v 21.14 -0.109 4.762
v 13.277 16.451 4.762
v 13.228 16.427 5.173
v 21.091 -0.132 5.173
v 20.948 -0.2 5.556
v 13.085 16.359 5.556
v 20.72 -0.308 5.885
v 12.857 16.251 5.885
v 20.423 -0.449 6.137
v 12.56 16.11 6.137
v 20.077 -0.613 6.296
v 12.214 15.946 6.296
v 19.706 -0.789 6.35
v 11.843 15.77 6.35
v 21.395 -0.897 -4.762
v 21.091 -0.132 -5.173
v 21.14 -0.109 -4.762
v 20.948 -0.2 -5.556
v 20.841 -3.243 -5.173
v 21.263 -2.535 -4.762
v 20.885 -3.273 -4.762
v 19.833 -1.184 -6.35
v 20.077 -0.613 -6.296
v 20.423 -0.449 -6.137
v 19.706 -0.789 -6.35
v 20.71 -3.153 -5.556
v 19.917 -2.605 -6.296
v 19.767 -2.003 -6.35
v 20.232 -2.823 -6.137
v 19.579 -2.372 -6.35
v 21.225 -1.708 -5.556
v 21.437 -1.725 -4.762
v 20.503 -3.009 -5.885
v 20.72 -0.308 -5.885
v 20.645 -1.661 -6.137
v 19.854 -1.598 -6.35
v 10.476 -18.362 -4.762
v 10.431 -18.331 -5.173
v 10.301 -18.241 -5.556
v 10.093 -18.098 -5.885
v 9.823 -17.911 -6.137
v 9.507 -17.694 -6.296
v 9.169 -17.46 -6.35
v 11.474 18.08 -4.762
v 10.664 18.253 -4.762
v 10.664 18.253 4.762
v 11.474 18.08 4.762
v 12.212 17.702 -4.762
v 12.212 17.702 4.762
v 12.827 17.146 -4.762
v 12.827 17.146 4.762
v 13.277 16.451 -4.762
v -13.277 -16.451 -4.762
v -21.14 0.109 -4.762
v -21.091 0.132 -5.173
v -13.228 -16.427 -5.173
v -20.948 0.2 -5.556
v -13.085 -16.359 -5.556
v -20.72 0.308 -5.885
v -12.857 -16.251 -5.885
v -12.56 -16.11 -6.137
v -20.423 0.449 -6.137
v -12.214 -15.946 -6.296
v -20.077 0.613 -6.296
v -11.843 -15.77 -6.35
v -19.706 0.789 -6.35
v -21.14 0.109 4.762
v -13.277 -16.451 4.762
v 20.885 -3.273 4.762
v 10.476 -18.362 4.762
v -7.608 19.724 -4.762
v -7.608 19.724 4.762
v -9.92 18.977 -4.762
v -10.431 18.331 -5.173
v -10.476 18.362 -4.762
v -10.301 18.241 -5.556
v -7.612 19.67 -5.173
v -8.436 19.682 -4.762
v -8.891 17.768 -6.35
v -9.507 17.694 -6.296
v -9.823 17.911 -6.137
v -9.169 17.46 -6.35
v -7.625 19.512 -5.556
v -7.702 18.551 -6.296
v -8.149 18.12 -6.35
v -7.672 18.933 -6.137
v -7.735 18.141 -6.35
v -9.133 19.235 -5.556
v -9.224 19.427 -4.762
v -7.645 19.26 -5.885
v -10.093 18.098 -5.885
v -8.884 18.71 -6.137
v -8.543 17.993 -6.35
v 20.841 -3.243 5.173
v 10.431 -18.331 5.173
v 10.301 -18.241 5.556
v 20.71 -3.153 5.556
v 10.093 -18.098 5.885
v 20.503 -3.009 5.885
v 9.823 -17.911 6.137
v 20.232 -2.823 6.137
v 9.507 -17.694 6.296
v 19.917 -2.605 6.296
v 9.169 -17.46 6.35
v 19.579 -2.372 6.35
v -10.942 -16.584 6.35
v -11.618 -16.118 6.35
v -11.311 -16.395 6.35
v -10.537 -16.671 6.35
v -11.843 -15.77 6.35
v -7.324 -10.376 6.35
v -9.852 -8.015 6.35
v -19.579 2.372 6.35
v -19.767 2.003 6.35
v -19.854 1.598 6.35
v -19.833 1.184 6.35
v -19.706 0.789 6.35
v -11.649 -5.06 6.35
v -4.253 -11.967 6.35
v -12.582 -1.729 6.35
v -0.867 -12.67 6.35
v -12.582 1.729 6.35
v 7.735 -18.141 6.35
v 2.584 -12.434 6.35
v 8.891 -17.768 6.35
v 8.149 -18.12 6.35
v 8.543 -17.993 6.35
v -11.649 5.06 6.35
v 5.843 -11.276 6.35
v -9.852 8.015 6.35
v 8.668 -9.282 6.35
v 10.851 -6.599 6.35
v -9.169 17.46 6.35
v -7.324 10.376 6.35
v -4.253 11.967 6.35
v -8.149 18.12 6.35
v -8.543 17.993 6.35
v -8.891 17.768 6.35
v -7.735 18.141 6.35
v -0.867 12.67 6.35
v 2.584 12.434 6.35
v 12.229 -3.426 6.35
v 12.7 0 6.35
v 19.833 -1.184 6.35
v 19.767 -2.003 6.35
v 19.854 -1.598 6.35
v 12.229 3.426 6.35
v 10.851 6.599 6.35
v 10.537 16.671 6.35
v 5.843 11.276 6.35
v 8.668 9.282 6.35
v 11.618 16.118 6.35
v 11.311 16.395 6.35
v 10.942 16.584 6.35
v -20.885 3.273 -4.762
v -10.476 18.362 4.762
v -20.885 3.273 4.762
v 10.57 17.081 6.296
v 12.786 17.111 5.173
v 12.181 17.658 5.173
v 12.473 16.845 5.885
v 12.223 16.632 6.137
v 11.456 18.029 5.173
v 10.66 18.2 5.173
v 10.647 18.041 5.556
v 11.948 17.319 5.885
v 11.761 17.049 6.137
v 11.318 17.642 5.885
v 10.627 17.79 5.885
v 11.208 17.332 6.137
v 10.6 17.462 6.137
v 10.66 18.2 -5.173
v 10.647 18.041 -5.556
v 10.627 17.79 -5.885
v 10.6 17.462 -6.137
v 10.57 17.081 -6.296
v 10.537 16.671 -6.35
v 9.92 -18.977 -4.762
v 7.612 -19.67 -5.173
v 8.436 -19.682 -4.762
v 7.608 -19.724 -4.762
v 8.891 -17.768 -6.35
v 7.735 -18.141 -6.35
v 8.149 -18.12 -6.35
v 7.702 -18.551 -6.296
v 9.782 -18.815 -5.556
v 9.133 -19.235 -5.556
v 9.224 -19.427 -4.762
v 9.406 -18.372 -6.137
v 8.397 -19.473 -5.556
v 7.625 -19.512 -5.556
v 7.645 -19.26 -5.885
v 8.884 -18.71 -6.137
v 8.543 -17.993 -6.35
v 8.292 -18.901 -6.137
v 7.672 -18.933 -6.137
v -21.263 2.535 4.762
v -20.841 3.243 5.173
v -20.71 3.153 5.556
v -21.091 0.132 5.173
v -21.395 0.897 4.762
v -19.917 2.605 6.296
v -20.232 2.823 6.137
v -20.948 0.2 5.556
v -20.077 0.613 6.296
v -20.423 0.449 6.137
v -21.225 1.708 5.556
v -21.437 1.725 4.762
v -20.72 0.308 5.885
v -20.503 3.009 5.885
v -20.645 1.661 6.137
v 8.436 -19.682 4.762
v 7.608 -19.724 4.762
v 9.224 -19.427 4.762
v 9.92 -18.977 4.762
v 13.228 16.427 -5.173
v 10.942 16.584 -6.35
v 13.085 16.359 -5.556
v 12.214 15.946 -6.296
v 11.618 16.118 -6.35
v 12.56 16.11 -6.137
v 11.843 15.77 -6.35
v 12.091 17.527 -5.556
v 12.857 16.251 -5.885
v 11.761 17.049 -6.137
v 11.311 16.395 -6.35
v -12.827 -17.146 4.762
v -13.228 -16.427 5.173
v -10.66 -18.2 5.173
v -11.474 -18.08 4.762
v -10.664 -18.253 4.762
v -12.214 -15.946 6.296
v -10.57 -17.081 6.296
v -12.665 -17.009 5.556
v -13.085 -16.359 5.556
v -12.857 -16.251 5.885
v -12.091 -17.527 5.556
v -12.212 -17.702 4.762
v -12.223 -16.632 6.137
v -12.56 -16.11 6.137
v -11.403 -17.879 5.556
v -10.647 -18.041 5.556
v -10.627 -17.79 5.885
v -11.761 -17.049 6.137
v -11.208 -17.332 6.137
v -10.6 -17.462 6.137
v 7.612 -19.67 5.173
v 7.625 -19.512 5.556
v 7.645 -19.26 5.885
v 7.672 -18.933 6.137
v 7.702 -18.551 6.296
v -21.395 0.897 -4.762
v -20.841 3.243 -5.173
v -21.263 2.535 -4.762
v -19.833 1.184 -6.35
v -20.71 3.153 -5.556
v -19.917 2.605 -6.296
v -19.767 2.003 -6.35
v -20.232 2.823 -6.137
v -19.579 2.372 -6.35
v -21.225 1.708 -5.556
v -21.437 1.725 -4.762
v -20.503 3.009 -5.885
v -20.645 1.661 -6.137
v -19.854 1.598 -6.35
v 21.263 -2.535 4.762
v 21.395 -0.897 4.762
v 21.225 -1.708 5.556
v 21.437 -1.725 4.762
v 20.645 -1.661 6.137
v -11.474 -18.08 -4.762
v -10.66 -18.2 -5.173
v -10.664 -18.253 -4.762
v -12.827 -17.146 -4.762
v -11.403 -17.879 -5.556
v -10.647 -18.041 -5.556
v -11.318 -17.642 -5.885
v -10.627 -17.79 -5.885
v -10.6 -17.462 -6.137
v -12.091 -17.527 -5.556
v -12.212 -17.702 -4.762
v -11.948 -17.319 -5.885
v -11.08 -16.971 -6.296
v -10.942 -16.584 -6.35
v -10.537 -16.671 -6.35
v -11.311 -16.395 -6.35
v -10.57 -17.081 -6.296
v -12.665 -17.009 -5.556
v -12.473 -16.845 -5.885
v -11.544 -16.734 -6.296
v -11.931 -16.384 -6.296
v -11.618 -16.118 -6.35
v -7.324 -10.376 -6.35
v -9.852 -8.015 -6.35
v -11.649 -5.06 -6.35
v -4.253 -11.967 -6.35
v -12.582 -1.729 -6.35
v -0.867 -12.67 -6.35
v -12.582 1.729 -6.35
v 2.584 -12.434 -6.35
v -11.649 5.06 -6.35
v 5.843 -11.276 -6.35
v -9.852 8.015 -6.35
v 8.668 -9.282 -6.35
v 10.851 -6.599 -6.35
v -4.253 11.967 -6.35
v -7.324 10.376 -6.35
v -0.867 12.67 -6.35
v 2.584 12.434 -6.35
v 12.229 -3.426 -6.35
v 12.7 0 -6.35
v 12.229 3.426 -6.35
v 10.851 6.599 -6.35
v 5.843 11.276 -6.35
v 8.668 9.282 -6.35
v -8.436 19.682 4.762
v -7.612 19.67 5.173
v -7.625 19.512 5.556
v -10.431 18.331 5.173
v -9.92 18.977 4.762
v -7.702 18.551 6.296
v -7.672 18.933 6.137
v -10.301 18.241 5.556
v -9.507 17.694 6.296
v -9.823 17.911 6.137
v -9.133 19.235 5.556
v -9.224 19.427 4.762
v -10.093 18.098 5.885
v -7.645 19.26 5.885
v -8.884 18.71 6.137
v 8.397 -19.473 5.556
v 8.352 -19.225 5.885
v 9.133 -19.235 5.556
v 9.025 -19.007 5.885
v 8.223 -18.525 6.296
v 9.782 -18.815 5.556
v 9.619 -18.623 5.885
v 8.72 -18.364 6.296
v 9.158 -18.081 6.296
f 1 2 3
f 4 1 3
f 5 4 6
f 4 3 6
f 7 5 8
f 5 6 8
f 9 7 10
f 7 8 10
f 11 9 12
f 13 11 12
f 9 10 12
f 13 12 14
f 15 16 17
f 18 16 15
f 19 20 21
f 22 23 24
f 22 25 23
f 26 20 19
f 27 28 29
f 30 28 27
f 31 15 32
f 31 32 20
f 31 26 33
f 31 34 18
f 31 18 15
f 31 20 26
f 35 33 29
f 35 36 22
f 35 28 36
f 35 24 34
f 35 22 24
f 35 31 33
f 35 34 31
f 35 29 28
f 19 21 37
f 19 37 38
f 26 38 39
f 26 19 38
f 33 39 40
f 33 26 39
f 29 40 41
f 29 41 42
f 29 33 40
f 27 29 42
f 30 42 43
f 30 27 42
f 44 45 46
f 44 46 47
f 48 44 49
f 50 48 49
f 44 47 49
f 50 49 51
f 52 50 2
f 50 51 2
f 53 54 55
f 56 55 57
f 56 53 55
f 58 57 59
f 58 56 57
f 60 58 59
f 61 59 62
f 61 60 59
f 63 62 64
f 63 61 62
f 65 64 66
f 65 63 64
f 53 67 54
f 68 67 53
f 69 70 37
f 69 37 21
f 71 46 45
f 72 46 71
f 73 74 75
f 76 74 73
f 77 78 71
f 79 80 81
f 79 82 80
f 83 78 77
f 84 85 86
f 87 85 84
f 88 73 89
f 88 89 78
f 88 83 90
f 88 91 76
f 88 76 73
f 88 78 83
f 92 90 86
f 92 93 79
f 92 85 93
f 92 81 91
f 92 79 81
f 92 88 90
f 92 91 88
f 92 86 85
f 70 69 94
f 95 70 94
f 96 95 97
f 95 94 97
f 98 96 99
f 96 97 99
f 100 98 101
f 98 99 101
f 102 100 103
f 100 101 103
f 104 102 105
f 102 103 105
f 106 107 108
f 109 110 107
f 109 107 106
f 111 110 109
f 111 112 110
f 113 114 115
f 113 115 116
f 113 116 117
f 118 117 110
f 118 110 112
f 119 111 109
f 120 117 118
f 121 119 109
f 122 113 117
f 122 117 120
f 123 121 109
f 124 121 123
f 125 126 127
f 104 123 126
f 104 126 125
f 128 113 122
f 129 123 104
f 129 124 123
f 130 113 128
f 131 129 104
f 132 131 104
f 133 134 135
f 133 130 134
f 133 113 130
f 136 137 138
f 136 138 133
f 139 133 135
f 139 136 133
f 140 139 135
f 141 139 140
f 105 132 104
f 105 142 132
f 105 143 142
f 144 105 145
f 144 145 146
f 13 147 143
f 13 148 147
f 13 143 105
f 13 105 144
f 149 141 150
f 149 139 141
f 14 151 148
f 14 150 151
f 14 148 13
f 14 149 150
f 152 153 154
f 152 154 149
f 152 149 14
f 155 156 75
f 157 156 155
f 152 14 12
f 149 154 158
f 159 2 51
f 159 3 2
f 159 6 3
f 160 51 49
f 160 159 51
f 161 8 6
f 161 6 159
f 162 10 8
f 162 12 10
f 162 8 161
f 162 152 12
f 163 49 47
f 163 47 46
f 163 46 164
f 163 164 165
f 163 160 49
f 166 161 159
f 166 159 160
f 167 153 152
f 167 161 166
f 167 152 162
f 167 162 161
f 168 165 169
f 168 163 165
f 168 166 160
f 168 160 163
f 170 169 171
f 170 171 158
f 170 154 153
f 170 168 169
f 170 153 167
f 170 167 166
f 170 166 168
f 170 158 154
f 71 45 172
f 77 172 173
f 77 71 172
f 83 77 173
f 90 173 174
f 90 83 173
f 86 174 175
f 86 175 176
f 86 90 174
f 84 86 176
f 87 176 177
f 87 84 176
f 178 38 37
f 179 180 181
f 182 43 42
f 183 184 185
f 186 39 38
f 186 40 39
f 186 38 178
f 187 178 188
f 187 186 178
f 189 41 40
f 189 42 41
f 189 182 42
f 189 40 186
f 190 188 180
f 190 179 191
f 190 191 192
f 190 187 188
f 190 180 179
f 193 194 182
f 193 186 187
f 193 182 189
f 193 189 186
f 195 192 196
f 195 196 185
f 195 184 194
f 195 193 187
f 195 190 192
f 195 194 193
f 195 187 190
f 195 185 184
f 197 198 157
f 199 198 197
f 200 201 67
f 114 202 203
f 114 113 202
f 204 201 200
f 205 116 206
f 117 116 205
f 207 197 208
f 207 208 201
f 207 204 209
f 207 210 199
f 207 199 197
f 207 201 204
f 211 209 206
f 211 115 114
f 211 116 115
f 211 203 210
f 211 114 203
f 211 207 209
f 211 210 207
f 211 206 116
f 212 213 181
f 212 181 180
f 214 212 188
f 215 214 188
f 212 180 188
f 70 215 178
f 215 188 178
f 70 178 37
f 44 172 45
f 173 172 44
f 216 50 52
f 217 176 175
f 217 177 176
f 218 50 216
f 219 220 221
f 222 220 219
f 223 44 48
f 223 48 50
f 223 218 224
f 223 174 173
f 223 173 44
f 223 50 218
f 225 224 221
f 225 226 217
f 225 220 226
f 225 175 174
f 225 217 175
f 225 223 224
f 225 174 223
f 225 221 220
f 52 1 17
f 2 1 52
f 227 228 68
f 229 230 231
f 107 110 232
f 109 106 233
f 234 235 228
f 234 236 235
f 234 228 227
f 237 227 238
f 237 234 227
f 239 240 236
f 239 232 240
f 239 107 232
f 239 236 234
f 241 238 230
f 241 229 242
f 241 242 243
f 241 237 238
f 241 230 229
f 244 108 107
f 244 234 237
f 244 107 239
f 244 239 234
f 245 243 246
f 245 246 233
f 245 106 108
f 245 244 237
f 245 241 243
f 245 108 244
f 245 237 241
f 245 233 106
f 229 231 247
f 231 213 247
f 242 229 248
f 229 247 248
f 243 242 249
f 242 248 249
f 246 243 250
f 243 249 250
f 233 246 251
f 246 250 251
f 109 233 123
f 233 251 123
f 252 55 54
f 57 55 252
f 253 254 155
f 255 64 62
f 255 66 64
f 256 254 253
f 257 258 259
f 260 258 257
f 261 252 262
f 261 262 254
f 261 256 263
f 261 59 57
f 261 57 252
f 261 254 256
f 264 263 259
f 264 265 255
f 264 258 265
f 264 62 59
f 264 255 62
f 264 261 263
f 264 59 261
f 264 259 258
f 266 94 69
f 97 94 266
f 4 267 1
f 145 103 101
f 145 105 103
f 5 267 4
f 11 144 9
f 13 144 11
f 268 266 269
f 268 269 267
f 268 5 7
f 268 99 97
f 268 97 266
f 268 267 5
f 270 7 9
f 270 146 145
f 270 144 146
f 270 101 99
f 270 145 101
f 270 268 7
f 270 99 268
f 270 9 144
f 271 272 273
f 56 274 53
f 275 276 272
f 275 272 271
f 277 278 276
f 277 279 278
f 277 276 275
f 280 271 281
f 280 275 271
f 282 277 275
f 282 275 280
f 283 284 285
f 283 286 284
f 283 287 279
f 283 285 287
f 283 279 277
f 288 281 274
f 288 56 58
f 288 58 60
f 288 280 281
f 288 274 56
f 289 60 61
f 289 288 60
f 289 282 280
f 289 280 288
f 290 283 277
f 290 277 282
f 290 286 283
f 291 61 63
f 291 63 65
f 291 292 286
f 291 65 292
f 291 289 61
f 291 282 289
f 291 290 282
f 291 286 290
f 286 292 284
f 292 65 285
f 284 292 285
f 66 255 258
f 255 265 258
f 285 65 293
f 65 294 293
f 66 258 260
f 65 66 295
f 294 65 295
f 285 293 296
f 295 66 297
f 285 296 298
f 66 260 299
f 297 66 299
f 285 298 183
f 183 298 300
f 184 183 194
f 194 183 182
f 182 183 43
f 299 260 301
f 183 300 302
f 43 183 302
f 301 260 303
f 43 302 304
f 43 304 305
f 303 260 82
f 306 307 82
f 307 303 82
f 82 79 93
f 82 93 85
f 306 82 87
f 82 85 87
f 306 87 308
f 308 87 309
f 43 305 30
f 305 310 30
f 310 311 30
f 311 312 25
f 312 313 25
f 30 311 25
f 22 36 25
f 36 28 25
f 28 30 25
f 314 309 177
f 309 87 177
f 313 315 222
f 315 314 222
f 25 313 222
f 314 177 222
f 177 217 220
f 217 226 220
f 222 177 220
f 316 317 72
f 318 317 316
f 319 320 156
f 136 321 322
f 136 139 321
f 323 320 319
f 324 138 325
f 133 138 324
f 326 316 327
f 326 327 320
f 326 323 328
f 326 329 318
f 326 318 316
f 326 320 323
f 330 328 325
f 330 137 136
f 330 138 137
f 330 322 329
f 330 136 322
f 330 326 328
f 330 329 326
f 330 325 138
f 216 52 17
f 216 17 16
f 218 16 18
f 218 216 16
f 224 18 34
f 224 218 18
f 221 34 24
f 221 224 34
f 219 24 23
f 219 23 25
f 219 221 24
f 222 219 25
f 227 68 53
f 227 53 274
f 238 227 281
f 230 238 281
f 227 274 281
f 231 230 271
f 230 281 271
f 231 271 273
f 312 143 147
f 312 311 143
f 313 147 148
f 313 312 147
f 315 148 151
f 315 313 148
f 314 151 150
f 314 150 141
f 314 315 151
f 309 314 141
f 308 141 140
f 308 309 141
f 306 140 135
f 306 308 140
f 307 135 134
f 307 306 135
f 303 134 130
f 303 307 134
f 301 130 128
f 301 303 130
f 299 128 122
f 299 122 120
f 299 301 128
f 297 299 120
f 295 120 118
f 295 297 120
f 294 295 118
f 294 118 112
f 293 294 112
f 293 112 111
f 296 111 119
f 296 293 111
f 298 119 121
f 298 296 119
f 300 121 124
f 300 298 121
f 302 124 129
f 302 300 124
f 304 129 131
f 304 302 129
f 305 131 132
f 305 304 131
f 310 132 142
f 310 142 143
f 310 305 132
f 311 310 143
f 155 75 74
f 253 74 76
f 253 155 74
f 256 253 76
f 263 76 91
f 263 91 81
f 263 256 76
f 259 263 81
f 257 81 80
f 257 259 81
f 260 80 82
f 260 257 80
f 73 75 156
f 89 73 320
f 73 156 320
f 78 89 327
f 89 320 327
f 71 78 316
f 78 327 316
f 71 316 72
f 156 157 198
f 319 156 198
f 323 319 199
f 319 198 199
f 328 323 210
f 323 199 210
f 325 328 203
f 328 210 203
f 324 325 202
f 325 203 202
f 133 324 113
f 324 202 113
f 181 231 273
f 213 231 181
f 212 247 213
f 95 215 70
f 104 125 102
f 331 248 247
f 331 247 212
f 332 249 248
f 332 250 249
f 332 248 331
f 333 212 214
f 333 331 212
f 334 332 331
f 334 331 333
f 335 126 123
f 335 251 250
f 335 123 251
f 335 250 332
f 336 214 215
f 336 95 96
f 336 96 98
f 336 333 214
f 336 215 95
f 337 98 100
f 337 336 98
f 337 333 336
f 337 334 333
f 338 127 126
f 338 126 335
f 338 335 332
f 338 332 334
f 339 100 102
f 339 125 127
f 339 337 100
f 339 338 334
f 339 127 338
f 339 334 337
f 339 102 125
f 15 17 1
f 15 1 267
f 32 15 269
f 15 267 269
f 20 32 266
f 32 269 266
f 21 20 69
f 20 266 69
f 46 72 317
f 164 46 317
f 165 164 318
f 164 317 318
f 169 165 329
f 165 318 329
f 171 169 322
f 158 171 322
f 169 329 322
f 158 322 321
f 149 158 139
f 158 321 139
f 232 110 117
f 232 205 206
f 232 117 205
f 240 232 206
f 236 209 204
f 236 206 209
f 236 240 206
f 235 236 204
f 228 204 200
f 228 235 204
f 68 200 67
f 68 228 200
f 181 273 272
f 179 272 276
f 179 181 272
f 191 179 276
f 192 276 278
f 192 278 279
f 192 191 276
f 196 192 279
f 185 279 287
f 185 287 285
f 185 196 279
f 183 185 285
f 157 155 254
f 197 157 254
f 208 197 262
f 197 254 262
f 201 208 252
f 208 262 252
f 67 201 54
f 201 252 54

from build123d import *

# Parameters (mm, degrees)
SKETCH1_R           = 12.7
BOSS_EXTRUDE1_DEPTH = 6.35
FILLET1_R           = 1.5875
FILLET2_R           = 3.175


with BuildPart() as part:
    # Sketch1 → Boss-Extrude1 (new, symmetric)
    with BuildSketch(Plane.XY):
        Polygon((-9.43506227631135, 19.870822827505833), (-21.92616850087544, 1.7644077961790767), (-12.491106224564081, -18.10641503132676), (9.43506227631137, -19.870822827505812), (21.926168500875455, -1.764407796179048), (12.491106224564096, 18.10641503132678), align=None)
        Circle(SKETCH1_R, mode=Mode.SUBTRACT)
    extrude(amount=BOSS_EXTRUDE1_DEPTH, both=True)

    # Fillet1
    fillet1_edges = [part.edges().sort_by_distance(p)[0] for p in [
        (-17.208637362719763, -8.17100361757384, 6.35),
        (-1.5280219741263554, -18.988618929416283, 6.35),
        (15.680615388593413, -10.81761531184243, 6.35),
        (17.208637362719777, 8.171003617573865, 6.35),
        (1.5280219741263732, 18.988618929416305, 6.35),
        (17.208637362719777, 8.171003617573865, -6.35),
        (15.680615388593413, -10.81761531184243, -6.35),
        (-1.5280219741263554, -18.988618929416283, -6.35),
        (-17.208637362719763, -8.17100361757384, -6.35),
        (-15.680615388593395, 10.817615311842456, -6.35),
        (1.5280219741263732, 18.988618929416305, -6.35),
        (-15.680615388593395, 10.817615311842456, 6.35),
    ]]
    fillet(fillet1_edges, radius=FILLET1_R)

    # Fillet2
    # the kernel refuses this fillet: 3.175 mm, written as the material it takes off along each edge
    with BuildSketch(Plane(origin=(-7.862551896926124, 16.559019022921532, -6.35), x_dir=(-0.8231294167240627, 0.5678538221439602, 0), z_dir=(-0.5678538221439602, -0.8231294167240627, 0))) as fillet2_piece_1:
        with BuildLine():
            CenterArc((1.5875, -1.5875), 1.5875, 0, 90)
            Line((3.175, -1.5875), (3.175, 0))
            Line((3.175, 0), (1.5875, 0))
        make_face()
    revolve(axis=Axis((-7.862551896926124, 16.559019022921532, -6.35), (0, 0, -1)), revolution_arc=59.999999999999986, mode=Mode.SUBTRACT)
    with BuildSketch(Plane(origin=(10.409255187136749, 15.088679192772318, -6.35), x_dir=(0.08021112725072843, 0.996777896557286, 0), z_dir=(-0.996777896557286, 0.08021112725072843, 0))) as fillet2_piece_2:
        with BuildLine():
            CenterArc((1.5875, -1.5875), 1.5875, 0, 90)
            Line((3.175, -1.5875), (3.175, 0))
            Line((3.175, 0), (1.5875, 0))
        make_face()
    revolve(axis=Axis((10.409255187136749, 15.088679192772318, -6.35), (0, 0, -1)), revolution_arc=59.99999999999997, mode=Mode.SUBTRACT)
    with BuildSketch(Plane(origin=(-18.271807084062868, 1.470339830149234, -6.35), x_dir=(-0.9033405439747911, -0.4289240744133263, 0), z_dir=(0.4289240744133263, -0.9033405439747911, 0))) as fillet2_piece_3:
        with BuildLine():
            CenterArc((1.5875, -1.5875), 1.5875, 0, 90)
            Line((3.175, -1.5875), (3.175, 0))
            Line((3.175, 0), (1.5875, 0))
        make_face()
    revolve(axis=Axis((-18.271807084062868, 1.470339830149234, -6.35), (0, 0, -1)), revolution_arc=60.000000000000036, mode=Mode.SUBTRACT)
    with BuildSketch(Plane(origin=(18.27180708406288, -1.4703398301492088, -6.35), x_dir=(0.903340543974791, 0.4289240744133264, 0), z_dir=(-0.4289240744133264, 0.903340543974791, 0))) as fillet2_piece_4:
        with BuildLine():
            CenterArc((1.5875, -1.5875), 1.5875, 0, 90)
            Line((3.175, -1.5875), (3.175, 0))
            Line((3.175, 0), (1.5875, 0))
        make_face()
    revolve(axis=Axis((18.27180708406288, -1.4703398301492088, -6.35), (0, 0, -1)), revolution_arc=60.00000000000001, mode=Mode.SUBTRACT)
    with BuildSketch(Plane(origin=(-10.40925518713673, -15.0886791927723, -6.35), x_dir=(-0.0802111272507284, -0.996777896557286, 0), z_dir=(0.996777896557286, -0.0802111272507284, 0))) as fillet2_piece_5:
        with BuildLine():
            CenterArc((1.5875, -1.5875), 1.5875, 0, 90)
            Line((3.175, -1.5875), (3.175, 0))
            Line((3.175, 0), (1.5875, 0))
        make_face()
    revolve(axis=Axis((-10.40925518713673, -15.0886791927723, -6.35), (0, 0, -1)), revolution_arc=59.99999999999997, mode=Mode.SUBTRACT)
    with BuildSketch(Plane(origin=(7.862551896926148, -16.559019022921508, -6.35), x_dir=(0.823129416724063, -0.5678538221439597, 0), z_dir=(0.5678538221439597, 0.823129416724063, 0))) as fillet2_piece_6:
        with BuildLine():
            CenterArc((1.5875, -1.5875), 1.5875, 0, 90)
            Line((3.175, -1.5875), (3.175, 0))
            Line((3.175, 0), (1.5875, 0))
        make_face()
    revolve(axis=Axis((7.862551896926148, -16.559019022921508, -6.35), (0, 0, -1)), revolution_arc=60.00000000000002, mode=Mode.SUBTRACT)
    with BuildSketch(Plane(origin=(7.862551896926148, -16.559019022921508, 6.35), x_dir=(-0.0802111272507284, -0.996777896557286, 0), z_dir=(-0.996777896557286, 0.0802111272507284, 0))) as fillet2_piece_7:
        with BuildLine():
            CenterArc((1.5875, -1.5875), 1.5875, 0, 90)
            Line((3.175, -1.5875), (3.175, 0))
            Line((3.175, 0), (1.5875, 0))
        make_face()
    revolve(axis=Axis((7.862551896926148, -16.559019022921508, 6.35), (0, 0, 1)), revolution_arc=60.00000000000002, mode=Mode.SUBTRACT)
    with BuildSketch(Plane(origin=(-10.40925518713673, -15.0886791927723, 6.35), x_dir=(-0.9033405439747911, -0.4289240744133263, 0), z_dir=(-0.4289240744133263, 0.9033405439747911, 0))) as fillet2_piece_8:
        with BuildLine():
            CenterArc((1.5875, -1.5875), 1.5875, 0, 90)
            Line((3.175, -1.5875), (3.175, 0))
            Line((3.175, 0), (1.5875, 0))
        make_face()
    revolve(axis=Axis((-10.40925518713673, -15.0886791927723, 6.35), (0, 0, 1)), revolution_arc=59.99999999999997, mode=Mode.SUBTRACT)
    with BuildSketch(Plane(origin=(18.27180708406288, -1.4703398301492088, 6.35), x_dir=(0.823129416724063, -0.5678538221439597, 0), z_dir=(-0.5678538221439597, -0.823129416724063, 0))) as fillet2_piece_9:
        with BuildLine():
            CenterArc((1.5875, -1.5875), 1.5875, 0, 90)
            Line((3.175, -1.5875), (3.175, 0))
            Line((3.175, 0), (1.5875, 0))
        make_face()
    revolve(axis=Axis((18.27180708406288, -1.4703398301492088, 6.35), (0, 0, 1)), revolution_arc=60.00000000000001, mode=Mode.SUBTRACT)
    with BuildSketch(Plane(origin=(-18.271807084062868, 1.470339830149234, 6.35), x_dir=(-0.8231294167240627, 0.5678538221439602, 0), z_dir=(0.5678538221439602, 0.8231294167240627, 0))) as fillet2_piece_10:
        with BuildLine():
            CenterArc((1.5875, -1.5875), 1.5875, 0, 90)
            Line((3.175, -1.5875), (3.175, 0))
            Line((3.175, 0), (1.5875, 0))
        make_face()
    revolve(axis=Axis((-18.271807084062868, 1.470339830149234, 6.35), (0, 0, 1)), revolution_arc=60.000000000000036, mode=Mode.SUBTRACT)
    with BuildSketch(Plane(origin=(10.409255187136749, 15.088679192772318, 6.35), x_dir=(0.903340543974791, 0.4289240744133264, 0), z_dir=(0.4289240744133264, -0.903340543974791, 0))) as fillet2_piece_11:
        with BuildLine():
            CenterArc((1.5875, -1.5875), 1.5875, 0, 90)
            Line((3.175, -1.5875), (3.175, 0))
            Line((3.175, 0), (1.5875, 0))
        make_face()
    revolve(axis=Axis((10.409255187136749, 15.088679192772318, 6.35), (0, 0, 1)), revolution_arc=59.99999999999997, mode=Mode.SUBTRACT)
    with BuildSketch(Plane(origin=(-7.862551896926124, 16.559019022921532, 6.35), x_dir=(0.08021112725072843, 0.996777896557286, 0), z_dir=(0.996777896557286, -0.08021112725072843, 0))) as fillet2_piece_12:
        with BuildLine():
            CenterArc((1.5875, -1.5875), 1.5875, 0, 90)
            Line((3.175, -1.5875), (3.175, 0))
            Line((3.175, 0), (1.5875, 0))
        make_face()
    revolve(axis=Axis((-7.862551896926124, 16.559019022921532, 6.35), (0, 0, 1)), revolution_arc=59.999999999999986, mode=Mode.SUBTRACT)
    with BuildSketch(Plane(origin=(9.43506227631137, -19.870822827505812, -6.35), x_dir=(-0.9967778965572859, 0.08021112725072867, 0), z_dir=(0, 0, 1))) as fillet2_piece_13:
        with BuildLine():
            CenterArc((FILLET2_R * 0.57735026919, -FILLET2_R), FILLET2_R, 90.00000000000003, 60)
            Line((-FILLET2_R * 0.288675134595, -FILLET2_R * 0.5), (0, 0))
            Line((0, 0), (FILLET2_R * 0.57735026919, -3e-17))
        make_face()
    extrude(amount=12.7, mode=Mode.SUBTRACT)
    with BuildSketch(Plane(origin=(-12.491106224564081, -18.106415031326755, -6.35), x_dir=(-0.4289240744133256, 0.9033405439747914, 0), z_dir=(0, 0, 1))) as fillet2_piece_14:
        with BuildLine():
            CenterArc((FILLET2_R * 0.57735026919, -FILLET2_R), FILLET2_R, 90.00000000000006, 59.99999999999994)
            Line((-FILLET2_R * 0.288675134595, -FILLET2_R * 0.5), (0, 0))
            Line((0, 0), (FILLET2_R * 0.57735026919, -1.1e-16))
        make_face()
    extrude(amount=12.7, mode=Mode.SUBTRACT)
    with BuildSketch(Plane(origin=(-21.92616850087544, 1.764407796179075, -6.350000000000001), x_dir=(0.5678538221439581, 0.8231294167240641, 0), z_dir=(0, 0, 1))) as fillet2_piece_15:
        with BuildLine():
            CenterArc((FILLET2_R * 0.57735026919, -FILLET2_R), FILLET2_R, 89.99999999999986, 60.000000000000114)
            Line((-FILLET2_R * 0.288675134595, -FILLET2_R * 0.5), (0, 0))
            Line((0, 0), (FILLET2_R * 0.57735026919, 0))
        make_face()
    extrude(amount=12.700000000000001, mode=Mode.SUBTRACT)
    with BuildSketch(Plane(origin=(-9.43506227631135, 19.870822827505833, 6.35), x_dir=(-0.5678538221439603, -0.8231294167240626, 0), z_dir=(0, 0, -1))) as fillet2_piece_16:
        with BuildLine():
            CenterArc((FILLET2_R * 0.57735026919, -FILLET2_R), FILLET2_R, 89.99999999999997, 59.99999999999997)
            Line((-FILLET2_R * 0.288675134595, -FILLET2_R * 0.5), (0, 0))
            Line((0, 0), (FILLET2_R * 0.57735026919, 0))
        make_face()
    extrude(amount=12.7, mode=Mode.SUBTRACT)
    with BuildSketch(Plane(origin=(12.491106224564094, 18.10641503132678, 6.350000000000001), x_dir=(-0.9967778965572859, 0.0802111272507286, 0), z_dir=(0, 0, -1))) as fillet2_piece_17:
        with BuildLine():
            CenterArc((FILLET2_R * 0.57735026919, -FILLET2_R), FILLET2_R, 89.99999999999997, 59.99999999999994)
            Line((-FILLET2_R * 0.288675134595, -FILLET2_R * 0.5), (0, 0))
            Line((0, 0), (FILLET2_R * 0.57735026919, 0))
        make_face()
    extrude(amount=12.700000000000001, mode=Mode.SUBTRACT)
    with BuildSketch(Plane(origin=(21.926168500875455, -1.7644077961790465, 6.35), x_dir=(-0.42892407441332714, 0.9033405439747906, 0), z_dir=(0, 0, -1))) as fillet2_piece_18:
        with BuildLine():
            CenterArc((FILLET2_R * 0.57735026919, -FILLET2_R), FILLET2_R, 90.00000000000007, 59.999999999999986)
            Line((-FILLET2_R * 0.288675134595, -FILLET2_R * 0.5), (0, 0))
            Line((0, 0), (FILLET2_R * 0.57735026919, 0))
        make_face()
    extrude(amount=12.7, mode=Mode.SUBTRACT)


solid = part.part
